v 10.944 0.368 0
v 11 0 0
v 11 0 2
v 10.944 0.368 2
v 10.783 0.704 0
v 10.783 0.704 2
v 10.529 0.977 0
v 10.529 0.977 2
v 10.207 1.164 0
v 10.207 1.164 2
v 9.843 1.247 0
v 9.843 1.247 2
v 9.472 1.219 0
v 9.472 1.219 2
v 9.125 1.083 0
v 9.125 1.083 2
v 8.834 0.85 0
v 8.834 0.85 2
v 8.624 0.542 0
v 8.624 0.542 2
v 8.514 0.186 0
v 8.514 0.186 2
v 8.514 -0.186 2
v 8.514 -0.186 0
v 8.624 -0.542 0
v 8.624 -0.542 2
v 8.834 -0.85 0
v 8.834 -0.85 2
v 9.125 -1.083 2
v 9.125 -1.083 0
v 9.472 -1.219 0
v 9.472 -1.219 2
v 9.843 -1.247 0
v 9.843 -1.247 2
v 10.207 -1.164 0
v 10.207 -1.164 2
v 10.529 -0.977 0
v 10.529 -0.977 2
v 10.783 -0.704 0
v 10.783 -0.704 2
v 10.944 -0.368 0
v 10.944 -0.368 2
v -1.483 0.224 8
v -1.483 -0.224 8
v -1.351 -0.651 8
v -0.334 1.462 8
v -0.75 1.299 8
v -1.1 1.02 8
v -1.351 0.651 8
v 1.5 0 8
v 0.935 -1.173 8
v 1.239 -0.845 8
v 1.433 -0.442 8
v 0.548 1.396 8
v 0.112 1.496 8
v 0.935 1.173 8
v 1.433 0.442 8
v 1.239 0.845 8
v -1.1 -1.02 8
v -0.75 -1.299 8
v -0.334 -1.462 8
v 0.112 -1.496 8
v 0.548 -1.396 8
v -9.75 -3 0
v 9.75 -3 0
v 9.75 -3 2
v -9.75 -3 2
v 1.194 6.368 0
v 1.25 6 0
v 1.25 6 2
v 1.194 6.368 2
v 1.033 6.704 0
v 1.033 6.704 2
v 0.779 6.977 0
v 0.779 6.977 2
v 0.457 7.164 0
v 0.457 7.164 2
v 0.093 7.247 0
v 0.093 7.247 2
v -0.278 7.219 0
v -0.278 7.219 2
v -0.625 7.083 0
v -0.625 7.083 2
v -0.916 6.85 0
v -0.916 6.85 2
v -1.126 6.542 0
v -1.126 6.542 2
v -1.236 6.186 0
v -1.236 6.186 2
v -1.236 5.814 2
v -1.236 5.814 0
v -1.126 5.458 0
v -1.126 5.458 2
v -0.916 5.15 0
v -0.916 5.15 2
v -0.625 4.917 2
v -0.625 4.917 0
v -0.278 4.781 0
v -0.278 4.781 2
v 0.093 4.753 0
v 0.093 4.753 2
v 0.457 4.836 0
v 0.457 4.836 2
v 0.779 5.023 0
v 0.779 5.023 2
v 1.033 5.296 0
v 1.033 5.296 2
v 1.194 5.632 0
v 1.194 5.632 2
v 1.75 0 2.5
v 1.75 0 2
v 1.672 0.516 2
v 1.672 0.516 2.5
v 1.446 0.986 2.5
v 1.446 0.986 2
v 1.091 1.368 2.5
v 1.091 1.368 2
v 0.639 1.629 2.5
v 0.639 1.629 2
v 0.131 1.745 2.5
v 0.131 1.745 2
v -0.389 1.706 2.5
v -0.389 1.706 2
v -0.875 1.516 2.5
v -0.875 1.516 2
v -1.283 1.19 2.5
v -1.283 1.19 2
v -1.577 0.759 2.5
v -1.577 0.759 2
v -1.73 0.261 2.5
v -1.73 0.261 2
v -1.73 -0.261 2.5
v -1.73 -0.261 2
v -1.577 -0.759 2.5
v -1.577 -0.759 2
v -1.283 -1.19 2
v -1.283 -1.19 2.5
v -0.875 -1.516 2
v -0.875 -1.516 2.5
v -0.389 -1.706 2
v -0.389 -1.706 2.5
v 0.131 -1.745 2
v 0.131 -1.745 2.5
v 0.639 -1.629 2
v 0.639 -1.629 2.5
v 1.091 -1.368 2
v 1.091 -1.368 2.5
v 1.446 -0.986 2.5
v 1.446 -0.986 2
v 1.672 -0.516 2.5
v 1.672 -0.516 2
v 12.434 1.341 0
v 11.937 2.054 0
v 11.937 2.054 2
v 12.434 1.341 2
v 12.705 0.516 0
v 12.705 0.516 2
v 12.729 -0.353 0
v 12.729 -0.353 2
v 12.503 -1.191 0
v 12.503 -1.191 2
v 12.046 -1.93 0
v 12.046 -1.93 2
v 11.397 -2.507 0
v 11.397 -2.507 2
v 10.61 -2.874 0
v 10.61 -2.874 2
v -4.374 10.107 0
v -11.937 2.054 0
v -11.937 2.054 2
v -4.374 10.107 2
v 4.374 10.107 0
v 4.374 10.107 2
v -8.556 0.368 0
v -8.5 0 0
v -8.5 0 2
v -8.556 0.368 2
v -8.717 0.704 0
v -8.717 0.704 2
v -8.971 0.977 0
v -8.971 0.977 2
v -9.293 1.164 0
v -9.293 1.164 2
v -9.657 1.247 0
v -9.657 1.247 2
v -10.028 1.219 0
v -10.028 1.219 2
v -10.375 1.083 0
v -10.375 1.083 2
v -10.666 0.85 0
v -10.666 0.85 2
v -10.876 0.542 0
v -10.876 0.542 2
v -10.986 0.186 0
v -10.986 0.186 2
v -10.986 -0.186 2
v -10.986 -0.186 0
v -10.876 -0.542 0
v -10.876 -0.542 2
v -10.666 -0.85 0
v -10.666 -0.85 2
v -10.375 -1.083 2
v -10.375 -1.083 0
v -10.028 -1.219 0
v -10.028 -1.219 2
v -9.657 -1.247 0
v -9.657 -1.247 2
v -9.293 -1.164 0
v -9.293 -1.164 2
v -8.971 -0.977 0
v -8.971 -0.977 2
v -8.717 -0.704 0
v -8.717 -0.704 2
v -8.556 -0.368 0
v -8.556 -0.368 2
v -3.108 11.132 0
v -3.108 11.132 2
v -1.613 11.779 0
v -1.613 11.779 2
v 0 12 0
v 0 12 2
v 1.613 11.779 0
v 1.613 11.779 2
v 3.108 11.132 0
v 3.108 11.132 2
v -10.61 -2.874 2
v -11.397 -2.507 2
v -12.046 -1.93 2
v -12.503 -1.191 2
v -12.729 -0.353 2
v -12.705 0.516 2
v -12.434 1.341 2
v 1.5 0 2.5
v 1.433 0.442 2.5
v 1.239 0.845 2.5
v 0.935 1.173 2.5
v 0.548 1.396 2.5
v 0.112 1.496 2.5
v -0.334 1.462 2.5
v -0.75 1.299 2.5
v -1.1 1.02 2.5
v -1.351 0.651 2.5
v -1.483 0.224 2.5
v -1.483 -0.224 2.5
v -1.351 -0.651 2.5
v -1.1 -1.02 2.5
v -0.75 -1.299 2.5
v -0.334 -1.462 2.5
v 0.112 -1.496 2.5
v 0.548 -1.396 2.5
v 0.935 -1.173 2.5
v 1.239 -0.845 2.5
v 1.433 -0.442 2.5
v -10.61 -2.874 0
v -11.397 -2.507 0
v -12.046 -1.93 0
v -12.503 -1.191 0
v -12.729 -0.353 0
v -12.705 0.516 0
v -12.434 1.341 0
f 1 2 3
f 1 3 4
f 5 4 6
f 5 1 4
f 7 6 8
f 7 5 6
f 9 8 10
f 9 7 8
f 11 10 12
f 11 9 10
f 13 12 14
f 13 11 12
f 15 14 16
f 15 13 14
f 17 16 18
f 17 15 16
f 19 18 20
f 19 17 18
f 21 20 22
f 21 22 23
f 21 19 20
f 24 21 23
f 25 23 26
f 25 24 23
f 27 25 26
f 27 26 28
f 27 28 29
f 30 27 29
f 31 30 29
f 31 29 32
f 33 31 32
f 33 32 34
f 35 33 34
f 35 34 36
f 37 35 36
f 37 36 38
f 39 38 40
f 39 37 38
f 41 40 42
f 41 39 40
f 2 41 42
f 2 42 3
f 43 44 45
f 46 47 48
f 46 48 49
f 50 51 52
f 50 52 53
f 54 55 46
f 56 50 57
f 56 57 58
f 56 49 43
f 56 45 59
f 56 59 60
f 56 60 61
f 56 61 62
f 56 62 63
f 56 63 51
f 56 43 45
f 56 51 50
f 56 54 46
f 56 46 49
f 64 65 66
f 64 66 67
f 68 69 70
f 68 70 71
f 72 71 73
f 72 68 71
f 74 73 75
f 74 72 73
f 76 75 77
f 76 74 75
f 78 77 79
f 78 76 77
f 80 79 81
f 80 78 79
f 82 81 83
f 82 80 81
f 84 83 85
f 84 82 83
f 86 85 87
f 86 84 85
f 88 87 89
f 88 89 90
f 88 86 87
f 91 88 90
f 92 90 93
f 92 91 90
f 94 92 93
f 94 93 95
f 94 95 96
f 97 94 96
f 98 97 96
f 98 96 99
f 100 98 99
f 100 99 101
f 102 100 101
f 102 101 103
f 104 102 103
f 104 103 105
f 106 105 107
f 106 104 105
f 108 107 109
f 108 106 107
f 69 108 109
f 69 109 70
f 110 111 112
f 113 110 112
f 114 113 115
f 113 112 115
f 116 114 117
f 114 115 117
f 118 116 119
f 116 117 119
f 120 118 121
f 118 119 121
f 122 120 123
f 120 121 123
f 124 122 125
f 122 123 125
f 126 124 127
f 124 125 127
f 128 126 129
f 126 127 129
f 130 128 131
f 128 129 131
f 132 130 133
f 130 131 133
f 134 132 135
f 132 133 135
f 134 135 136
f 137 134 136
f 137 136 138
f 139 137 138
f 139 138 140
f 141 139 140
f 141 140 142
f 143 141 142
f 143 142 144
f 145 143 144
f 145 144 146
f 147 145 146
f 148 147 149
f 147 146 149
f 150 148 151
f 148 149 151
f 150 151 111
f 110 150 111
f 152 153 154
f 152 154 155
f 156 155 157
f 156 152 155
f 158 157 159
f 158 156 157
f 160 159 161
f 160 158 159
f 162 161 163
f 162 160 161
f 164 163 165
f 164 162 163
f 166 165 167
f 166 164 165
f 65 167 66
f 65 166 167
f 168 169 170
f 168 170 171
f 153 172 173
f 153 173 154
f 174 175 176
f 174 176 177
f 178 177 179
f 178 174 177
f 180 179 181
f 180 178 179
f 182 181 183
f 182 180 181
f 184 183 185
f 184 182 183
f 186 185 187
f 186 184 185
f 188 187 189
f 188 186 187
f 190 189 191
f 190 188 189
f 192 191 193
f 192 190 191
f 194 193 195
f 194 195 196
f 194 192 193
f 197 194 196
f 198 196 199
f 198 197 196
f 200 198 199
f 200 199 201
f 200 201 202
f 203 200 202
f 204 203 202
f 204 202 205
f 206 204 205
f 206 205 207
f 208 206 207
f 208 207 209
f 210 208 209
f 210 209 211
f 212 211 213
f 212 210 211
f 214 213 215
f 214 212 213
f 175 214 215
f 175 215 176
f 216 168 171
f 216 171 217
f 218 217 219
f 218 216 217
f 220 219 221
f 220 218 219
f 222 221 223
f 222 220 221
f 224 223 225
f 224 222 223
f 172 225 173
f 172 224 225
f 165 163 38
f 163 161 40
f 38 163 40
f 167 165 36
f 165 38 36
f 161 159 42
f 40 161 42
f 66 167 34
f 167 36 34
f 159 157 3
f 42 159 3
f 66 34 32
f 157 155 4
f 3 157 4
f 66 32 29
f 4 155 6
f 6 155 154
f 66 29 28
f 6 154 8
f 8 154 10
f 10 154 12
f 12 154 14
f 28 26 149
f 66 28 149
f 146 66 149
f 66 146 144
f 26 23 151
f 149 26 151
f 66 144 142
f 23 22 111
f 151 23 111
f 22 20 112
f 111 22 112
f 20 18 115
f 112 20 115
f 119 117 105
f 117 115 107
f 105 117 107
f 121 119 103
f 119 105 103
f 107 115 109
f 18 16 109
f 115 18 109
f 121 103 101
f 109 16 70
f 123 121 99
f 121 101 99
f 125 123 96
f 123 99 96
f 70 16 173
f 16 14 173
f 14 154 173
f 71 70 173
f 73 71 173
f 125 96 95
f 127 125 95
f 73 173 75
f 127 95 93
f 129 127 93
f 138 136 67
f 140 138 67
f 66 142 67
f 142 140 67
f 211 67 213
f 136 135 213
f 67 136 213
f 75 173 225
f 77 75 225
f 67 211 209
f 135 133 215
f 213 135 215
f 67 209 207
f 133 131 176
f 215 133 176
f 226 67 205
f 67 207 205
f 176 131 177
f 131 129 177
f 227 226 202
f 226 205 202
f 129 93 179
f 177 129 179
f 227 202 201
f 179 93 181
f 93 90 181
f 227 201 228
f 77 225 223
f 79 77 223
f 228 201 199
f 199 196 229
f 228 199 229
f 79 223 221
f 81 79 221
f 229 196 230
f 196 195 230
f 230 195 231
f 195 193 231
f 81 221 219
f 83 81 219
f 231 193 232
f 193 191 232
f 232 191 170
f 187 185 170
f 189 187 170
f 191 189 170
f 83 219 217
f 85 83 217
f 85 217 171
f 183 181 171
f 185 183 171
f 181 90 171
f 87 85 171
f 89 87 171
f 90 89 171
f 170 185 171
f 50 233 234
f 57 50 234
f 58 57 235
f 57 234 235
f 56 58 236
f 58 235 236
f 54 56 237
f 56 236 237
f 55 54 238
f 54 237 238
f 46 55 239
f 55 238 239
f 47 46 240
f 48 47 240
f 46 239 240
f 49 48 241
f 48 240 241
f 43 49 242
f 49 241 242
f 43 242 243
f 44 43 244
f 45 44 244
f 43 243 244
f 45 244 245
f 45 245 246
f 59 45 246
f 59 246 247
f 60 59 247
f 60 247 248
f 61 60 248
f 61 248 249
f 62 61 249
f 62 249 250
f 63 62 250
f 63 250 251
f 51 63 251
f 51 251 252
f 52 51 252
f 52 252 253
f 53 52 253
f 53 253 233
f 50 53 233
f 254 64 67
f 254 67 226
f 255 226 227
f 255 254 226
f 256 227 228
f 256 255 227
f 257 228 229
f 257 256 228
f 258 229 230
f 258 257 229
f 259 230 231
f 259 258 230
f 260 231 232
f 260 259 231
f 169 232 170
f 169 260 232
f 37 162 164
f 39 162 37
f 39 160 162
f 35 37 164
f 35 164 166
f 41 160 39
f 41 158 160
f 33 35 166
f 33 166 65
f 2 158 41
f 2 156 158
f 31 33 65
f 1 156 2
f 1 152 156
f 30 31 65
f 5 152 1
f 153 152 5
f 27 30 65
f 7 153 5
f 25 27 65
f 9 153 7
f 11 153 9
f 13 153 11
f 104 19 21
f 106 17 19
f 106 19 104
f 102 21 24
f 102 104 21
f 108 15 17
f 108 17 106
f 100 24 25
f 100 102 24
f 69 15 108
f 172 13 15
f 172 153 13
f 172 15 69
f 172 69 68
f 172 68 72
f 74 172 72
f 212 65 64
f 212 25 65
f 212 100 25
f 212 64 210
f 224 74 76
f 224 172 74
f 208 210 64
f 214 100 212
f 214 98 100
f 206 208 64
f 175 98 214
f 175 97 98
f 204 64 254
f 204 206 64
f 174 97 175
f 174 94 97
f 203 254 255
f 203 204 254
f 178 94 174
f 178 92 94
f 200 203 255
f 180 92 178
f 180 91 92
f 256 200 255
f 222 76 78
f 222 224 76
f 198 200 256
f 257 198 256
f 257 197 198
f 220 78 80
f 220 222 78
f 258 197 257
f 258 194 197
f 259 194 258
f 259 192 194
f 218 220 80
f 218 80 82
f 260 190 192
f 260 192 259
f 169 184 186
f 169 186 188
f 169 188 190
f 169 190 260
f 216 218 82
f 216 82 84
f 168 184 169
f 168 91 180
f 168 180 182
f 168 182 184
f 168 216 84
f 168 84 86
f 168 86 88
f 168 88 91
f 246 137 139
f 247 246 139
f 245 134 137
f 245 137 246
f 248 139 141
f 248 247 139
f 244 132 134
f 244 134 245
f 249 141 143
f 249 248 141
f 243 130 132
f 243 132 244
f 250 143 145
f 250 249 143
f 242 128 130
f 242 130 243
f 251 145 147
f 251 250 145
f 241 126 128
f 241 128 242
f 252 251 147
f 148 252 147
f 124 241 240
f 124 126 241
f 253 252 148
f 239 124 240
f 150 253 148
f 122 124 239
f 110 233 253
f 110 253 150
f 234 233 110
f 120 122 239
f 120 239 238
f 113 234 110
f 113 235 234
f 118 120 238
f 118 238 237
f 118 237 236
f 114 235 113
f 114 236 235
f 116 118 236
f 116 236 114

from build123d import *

# Parameters (mm, degrees)
ESQUISSE1_R        = 1.25
BOSS_EXTRU_1_DEPTH = 2
ESQUISSE2_R        = 1.5
BOSS_EXTRU_2_DEPTH = 6
ESQUISSE3_R        = 1.75
BOSS_EXTRU_3_DEPTH = 0.5


with BuildPart() as part:
    # Esquisse1 → Boss.-Extru.1 (new body)
    with BuildSketch(Plane.XY):
        with BuildLine():
            Line((9.75, -3), (-9.75, -3))
            ThreePointArc((-9.75, -3), (-12.503272584, -1.191423551), (-11.936875866, 2.053673282))
            Line((-11.936875866, 2.053673282), (-4.373751731, 10.107346563))
            ThreePointArc((-4.373751731, 10.107346563), (0, 12), (4.373751731, 10.107346563))
            Line((4.373751731, 10.107346563), (11.936875866, 2.053673282))
            ThreePointArc((11.936875866, 2.053673282), (12.503272584, -1.191423551), (9.75, -3))
        make_face()
        with Locations((0, 6)):
            Circle(ESQUISSE1_R, mode=Mode.SUBTRACT)
        with Locations((9.75, 0)):
            Circle(ESQUISSE1_R, mode=Mode.SUBTRACT)
        with Locations((-9.75, 0)):
            Circle(ESQUISSE1_R, mode=Mode.SUBTRACT)
    extrude(amount=BOSS_EXTRU_1_DEPTH)

    # Esquisse2 → Boss.-Extru.2 (add)
    with BuildSketch(Plane.XY.offset(2)):
        Circle(ESQUISSE2_R)
    extrude(amount=BOSS_EXTRU_2_DEPTH)

    # Esquisse3 → Boss.-Extru.3 (add)
    with BuildSketch(Plane.XY.offset(2)):
        Circle(ESQUISSE3_R)
    extrude(amount=BOSS_EXTRU_3_DEPTH)


solid = part.part
